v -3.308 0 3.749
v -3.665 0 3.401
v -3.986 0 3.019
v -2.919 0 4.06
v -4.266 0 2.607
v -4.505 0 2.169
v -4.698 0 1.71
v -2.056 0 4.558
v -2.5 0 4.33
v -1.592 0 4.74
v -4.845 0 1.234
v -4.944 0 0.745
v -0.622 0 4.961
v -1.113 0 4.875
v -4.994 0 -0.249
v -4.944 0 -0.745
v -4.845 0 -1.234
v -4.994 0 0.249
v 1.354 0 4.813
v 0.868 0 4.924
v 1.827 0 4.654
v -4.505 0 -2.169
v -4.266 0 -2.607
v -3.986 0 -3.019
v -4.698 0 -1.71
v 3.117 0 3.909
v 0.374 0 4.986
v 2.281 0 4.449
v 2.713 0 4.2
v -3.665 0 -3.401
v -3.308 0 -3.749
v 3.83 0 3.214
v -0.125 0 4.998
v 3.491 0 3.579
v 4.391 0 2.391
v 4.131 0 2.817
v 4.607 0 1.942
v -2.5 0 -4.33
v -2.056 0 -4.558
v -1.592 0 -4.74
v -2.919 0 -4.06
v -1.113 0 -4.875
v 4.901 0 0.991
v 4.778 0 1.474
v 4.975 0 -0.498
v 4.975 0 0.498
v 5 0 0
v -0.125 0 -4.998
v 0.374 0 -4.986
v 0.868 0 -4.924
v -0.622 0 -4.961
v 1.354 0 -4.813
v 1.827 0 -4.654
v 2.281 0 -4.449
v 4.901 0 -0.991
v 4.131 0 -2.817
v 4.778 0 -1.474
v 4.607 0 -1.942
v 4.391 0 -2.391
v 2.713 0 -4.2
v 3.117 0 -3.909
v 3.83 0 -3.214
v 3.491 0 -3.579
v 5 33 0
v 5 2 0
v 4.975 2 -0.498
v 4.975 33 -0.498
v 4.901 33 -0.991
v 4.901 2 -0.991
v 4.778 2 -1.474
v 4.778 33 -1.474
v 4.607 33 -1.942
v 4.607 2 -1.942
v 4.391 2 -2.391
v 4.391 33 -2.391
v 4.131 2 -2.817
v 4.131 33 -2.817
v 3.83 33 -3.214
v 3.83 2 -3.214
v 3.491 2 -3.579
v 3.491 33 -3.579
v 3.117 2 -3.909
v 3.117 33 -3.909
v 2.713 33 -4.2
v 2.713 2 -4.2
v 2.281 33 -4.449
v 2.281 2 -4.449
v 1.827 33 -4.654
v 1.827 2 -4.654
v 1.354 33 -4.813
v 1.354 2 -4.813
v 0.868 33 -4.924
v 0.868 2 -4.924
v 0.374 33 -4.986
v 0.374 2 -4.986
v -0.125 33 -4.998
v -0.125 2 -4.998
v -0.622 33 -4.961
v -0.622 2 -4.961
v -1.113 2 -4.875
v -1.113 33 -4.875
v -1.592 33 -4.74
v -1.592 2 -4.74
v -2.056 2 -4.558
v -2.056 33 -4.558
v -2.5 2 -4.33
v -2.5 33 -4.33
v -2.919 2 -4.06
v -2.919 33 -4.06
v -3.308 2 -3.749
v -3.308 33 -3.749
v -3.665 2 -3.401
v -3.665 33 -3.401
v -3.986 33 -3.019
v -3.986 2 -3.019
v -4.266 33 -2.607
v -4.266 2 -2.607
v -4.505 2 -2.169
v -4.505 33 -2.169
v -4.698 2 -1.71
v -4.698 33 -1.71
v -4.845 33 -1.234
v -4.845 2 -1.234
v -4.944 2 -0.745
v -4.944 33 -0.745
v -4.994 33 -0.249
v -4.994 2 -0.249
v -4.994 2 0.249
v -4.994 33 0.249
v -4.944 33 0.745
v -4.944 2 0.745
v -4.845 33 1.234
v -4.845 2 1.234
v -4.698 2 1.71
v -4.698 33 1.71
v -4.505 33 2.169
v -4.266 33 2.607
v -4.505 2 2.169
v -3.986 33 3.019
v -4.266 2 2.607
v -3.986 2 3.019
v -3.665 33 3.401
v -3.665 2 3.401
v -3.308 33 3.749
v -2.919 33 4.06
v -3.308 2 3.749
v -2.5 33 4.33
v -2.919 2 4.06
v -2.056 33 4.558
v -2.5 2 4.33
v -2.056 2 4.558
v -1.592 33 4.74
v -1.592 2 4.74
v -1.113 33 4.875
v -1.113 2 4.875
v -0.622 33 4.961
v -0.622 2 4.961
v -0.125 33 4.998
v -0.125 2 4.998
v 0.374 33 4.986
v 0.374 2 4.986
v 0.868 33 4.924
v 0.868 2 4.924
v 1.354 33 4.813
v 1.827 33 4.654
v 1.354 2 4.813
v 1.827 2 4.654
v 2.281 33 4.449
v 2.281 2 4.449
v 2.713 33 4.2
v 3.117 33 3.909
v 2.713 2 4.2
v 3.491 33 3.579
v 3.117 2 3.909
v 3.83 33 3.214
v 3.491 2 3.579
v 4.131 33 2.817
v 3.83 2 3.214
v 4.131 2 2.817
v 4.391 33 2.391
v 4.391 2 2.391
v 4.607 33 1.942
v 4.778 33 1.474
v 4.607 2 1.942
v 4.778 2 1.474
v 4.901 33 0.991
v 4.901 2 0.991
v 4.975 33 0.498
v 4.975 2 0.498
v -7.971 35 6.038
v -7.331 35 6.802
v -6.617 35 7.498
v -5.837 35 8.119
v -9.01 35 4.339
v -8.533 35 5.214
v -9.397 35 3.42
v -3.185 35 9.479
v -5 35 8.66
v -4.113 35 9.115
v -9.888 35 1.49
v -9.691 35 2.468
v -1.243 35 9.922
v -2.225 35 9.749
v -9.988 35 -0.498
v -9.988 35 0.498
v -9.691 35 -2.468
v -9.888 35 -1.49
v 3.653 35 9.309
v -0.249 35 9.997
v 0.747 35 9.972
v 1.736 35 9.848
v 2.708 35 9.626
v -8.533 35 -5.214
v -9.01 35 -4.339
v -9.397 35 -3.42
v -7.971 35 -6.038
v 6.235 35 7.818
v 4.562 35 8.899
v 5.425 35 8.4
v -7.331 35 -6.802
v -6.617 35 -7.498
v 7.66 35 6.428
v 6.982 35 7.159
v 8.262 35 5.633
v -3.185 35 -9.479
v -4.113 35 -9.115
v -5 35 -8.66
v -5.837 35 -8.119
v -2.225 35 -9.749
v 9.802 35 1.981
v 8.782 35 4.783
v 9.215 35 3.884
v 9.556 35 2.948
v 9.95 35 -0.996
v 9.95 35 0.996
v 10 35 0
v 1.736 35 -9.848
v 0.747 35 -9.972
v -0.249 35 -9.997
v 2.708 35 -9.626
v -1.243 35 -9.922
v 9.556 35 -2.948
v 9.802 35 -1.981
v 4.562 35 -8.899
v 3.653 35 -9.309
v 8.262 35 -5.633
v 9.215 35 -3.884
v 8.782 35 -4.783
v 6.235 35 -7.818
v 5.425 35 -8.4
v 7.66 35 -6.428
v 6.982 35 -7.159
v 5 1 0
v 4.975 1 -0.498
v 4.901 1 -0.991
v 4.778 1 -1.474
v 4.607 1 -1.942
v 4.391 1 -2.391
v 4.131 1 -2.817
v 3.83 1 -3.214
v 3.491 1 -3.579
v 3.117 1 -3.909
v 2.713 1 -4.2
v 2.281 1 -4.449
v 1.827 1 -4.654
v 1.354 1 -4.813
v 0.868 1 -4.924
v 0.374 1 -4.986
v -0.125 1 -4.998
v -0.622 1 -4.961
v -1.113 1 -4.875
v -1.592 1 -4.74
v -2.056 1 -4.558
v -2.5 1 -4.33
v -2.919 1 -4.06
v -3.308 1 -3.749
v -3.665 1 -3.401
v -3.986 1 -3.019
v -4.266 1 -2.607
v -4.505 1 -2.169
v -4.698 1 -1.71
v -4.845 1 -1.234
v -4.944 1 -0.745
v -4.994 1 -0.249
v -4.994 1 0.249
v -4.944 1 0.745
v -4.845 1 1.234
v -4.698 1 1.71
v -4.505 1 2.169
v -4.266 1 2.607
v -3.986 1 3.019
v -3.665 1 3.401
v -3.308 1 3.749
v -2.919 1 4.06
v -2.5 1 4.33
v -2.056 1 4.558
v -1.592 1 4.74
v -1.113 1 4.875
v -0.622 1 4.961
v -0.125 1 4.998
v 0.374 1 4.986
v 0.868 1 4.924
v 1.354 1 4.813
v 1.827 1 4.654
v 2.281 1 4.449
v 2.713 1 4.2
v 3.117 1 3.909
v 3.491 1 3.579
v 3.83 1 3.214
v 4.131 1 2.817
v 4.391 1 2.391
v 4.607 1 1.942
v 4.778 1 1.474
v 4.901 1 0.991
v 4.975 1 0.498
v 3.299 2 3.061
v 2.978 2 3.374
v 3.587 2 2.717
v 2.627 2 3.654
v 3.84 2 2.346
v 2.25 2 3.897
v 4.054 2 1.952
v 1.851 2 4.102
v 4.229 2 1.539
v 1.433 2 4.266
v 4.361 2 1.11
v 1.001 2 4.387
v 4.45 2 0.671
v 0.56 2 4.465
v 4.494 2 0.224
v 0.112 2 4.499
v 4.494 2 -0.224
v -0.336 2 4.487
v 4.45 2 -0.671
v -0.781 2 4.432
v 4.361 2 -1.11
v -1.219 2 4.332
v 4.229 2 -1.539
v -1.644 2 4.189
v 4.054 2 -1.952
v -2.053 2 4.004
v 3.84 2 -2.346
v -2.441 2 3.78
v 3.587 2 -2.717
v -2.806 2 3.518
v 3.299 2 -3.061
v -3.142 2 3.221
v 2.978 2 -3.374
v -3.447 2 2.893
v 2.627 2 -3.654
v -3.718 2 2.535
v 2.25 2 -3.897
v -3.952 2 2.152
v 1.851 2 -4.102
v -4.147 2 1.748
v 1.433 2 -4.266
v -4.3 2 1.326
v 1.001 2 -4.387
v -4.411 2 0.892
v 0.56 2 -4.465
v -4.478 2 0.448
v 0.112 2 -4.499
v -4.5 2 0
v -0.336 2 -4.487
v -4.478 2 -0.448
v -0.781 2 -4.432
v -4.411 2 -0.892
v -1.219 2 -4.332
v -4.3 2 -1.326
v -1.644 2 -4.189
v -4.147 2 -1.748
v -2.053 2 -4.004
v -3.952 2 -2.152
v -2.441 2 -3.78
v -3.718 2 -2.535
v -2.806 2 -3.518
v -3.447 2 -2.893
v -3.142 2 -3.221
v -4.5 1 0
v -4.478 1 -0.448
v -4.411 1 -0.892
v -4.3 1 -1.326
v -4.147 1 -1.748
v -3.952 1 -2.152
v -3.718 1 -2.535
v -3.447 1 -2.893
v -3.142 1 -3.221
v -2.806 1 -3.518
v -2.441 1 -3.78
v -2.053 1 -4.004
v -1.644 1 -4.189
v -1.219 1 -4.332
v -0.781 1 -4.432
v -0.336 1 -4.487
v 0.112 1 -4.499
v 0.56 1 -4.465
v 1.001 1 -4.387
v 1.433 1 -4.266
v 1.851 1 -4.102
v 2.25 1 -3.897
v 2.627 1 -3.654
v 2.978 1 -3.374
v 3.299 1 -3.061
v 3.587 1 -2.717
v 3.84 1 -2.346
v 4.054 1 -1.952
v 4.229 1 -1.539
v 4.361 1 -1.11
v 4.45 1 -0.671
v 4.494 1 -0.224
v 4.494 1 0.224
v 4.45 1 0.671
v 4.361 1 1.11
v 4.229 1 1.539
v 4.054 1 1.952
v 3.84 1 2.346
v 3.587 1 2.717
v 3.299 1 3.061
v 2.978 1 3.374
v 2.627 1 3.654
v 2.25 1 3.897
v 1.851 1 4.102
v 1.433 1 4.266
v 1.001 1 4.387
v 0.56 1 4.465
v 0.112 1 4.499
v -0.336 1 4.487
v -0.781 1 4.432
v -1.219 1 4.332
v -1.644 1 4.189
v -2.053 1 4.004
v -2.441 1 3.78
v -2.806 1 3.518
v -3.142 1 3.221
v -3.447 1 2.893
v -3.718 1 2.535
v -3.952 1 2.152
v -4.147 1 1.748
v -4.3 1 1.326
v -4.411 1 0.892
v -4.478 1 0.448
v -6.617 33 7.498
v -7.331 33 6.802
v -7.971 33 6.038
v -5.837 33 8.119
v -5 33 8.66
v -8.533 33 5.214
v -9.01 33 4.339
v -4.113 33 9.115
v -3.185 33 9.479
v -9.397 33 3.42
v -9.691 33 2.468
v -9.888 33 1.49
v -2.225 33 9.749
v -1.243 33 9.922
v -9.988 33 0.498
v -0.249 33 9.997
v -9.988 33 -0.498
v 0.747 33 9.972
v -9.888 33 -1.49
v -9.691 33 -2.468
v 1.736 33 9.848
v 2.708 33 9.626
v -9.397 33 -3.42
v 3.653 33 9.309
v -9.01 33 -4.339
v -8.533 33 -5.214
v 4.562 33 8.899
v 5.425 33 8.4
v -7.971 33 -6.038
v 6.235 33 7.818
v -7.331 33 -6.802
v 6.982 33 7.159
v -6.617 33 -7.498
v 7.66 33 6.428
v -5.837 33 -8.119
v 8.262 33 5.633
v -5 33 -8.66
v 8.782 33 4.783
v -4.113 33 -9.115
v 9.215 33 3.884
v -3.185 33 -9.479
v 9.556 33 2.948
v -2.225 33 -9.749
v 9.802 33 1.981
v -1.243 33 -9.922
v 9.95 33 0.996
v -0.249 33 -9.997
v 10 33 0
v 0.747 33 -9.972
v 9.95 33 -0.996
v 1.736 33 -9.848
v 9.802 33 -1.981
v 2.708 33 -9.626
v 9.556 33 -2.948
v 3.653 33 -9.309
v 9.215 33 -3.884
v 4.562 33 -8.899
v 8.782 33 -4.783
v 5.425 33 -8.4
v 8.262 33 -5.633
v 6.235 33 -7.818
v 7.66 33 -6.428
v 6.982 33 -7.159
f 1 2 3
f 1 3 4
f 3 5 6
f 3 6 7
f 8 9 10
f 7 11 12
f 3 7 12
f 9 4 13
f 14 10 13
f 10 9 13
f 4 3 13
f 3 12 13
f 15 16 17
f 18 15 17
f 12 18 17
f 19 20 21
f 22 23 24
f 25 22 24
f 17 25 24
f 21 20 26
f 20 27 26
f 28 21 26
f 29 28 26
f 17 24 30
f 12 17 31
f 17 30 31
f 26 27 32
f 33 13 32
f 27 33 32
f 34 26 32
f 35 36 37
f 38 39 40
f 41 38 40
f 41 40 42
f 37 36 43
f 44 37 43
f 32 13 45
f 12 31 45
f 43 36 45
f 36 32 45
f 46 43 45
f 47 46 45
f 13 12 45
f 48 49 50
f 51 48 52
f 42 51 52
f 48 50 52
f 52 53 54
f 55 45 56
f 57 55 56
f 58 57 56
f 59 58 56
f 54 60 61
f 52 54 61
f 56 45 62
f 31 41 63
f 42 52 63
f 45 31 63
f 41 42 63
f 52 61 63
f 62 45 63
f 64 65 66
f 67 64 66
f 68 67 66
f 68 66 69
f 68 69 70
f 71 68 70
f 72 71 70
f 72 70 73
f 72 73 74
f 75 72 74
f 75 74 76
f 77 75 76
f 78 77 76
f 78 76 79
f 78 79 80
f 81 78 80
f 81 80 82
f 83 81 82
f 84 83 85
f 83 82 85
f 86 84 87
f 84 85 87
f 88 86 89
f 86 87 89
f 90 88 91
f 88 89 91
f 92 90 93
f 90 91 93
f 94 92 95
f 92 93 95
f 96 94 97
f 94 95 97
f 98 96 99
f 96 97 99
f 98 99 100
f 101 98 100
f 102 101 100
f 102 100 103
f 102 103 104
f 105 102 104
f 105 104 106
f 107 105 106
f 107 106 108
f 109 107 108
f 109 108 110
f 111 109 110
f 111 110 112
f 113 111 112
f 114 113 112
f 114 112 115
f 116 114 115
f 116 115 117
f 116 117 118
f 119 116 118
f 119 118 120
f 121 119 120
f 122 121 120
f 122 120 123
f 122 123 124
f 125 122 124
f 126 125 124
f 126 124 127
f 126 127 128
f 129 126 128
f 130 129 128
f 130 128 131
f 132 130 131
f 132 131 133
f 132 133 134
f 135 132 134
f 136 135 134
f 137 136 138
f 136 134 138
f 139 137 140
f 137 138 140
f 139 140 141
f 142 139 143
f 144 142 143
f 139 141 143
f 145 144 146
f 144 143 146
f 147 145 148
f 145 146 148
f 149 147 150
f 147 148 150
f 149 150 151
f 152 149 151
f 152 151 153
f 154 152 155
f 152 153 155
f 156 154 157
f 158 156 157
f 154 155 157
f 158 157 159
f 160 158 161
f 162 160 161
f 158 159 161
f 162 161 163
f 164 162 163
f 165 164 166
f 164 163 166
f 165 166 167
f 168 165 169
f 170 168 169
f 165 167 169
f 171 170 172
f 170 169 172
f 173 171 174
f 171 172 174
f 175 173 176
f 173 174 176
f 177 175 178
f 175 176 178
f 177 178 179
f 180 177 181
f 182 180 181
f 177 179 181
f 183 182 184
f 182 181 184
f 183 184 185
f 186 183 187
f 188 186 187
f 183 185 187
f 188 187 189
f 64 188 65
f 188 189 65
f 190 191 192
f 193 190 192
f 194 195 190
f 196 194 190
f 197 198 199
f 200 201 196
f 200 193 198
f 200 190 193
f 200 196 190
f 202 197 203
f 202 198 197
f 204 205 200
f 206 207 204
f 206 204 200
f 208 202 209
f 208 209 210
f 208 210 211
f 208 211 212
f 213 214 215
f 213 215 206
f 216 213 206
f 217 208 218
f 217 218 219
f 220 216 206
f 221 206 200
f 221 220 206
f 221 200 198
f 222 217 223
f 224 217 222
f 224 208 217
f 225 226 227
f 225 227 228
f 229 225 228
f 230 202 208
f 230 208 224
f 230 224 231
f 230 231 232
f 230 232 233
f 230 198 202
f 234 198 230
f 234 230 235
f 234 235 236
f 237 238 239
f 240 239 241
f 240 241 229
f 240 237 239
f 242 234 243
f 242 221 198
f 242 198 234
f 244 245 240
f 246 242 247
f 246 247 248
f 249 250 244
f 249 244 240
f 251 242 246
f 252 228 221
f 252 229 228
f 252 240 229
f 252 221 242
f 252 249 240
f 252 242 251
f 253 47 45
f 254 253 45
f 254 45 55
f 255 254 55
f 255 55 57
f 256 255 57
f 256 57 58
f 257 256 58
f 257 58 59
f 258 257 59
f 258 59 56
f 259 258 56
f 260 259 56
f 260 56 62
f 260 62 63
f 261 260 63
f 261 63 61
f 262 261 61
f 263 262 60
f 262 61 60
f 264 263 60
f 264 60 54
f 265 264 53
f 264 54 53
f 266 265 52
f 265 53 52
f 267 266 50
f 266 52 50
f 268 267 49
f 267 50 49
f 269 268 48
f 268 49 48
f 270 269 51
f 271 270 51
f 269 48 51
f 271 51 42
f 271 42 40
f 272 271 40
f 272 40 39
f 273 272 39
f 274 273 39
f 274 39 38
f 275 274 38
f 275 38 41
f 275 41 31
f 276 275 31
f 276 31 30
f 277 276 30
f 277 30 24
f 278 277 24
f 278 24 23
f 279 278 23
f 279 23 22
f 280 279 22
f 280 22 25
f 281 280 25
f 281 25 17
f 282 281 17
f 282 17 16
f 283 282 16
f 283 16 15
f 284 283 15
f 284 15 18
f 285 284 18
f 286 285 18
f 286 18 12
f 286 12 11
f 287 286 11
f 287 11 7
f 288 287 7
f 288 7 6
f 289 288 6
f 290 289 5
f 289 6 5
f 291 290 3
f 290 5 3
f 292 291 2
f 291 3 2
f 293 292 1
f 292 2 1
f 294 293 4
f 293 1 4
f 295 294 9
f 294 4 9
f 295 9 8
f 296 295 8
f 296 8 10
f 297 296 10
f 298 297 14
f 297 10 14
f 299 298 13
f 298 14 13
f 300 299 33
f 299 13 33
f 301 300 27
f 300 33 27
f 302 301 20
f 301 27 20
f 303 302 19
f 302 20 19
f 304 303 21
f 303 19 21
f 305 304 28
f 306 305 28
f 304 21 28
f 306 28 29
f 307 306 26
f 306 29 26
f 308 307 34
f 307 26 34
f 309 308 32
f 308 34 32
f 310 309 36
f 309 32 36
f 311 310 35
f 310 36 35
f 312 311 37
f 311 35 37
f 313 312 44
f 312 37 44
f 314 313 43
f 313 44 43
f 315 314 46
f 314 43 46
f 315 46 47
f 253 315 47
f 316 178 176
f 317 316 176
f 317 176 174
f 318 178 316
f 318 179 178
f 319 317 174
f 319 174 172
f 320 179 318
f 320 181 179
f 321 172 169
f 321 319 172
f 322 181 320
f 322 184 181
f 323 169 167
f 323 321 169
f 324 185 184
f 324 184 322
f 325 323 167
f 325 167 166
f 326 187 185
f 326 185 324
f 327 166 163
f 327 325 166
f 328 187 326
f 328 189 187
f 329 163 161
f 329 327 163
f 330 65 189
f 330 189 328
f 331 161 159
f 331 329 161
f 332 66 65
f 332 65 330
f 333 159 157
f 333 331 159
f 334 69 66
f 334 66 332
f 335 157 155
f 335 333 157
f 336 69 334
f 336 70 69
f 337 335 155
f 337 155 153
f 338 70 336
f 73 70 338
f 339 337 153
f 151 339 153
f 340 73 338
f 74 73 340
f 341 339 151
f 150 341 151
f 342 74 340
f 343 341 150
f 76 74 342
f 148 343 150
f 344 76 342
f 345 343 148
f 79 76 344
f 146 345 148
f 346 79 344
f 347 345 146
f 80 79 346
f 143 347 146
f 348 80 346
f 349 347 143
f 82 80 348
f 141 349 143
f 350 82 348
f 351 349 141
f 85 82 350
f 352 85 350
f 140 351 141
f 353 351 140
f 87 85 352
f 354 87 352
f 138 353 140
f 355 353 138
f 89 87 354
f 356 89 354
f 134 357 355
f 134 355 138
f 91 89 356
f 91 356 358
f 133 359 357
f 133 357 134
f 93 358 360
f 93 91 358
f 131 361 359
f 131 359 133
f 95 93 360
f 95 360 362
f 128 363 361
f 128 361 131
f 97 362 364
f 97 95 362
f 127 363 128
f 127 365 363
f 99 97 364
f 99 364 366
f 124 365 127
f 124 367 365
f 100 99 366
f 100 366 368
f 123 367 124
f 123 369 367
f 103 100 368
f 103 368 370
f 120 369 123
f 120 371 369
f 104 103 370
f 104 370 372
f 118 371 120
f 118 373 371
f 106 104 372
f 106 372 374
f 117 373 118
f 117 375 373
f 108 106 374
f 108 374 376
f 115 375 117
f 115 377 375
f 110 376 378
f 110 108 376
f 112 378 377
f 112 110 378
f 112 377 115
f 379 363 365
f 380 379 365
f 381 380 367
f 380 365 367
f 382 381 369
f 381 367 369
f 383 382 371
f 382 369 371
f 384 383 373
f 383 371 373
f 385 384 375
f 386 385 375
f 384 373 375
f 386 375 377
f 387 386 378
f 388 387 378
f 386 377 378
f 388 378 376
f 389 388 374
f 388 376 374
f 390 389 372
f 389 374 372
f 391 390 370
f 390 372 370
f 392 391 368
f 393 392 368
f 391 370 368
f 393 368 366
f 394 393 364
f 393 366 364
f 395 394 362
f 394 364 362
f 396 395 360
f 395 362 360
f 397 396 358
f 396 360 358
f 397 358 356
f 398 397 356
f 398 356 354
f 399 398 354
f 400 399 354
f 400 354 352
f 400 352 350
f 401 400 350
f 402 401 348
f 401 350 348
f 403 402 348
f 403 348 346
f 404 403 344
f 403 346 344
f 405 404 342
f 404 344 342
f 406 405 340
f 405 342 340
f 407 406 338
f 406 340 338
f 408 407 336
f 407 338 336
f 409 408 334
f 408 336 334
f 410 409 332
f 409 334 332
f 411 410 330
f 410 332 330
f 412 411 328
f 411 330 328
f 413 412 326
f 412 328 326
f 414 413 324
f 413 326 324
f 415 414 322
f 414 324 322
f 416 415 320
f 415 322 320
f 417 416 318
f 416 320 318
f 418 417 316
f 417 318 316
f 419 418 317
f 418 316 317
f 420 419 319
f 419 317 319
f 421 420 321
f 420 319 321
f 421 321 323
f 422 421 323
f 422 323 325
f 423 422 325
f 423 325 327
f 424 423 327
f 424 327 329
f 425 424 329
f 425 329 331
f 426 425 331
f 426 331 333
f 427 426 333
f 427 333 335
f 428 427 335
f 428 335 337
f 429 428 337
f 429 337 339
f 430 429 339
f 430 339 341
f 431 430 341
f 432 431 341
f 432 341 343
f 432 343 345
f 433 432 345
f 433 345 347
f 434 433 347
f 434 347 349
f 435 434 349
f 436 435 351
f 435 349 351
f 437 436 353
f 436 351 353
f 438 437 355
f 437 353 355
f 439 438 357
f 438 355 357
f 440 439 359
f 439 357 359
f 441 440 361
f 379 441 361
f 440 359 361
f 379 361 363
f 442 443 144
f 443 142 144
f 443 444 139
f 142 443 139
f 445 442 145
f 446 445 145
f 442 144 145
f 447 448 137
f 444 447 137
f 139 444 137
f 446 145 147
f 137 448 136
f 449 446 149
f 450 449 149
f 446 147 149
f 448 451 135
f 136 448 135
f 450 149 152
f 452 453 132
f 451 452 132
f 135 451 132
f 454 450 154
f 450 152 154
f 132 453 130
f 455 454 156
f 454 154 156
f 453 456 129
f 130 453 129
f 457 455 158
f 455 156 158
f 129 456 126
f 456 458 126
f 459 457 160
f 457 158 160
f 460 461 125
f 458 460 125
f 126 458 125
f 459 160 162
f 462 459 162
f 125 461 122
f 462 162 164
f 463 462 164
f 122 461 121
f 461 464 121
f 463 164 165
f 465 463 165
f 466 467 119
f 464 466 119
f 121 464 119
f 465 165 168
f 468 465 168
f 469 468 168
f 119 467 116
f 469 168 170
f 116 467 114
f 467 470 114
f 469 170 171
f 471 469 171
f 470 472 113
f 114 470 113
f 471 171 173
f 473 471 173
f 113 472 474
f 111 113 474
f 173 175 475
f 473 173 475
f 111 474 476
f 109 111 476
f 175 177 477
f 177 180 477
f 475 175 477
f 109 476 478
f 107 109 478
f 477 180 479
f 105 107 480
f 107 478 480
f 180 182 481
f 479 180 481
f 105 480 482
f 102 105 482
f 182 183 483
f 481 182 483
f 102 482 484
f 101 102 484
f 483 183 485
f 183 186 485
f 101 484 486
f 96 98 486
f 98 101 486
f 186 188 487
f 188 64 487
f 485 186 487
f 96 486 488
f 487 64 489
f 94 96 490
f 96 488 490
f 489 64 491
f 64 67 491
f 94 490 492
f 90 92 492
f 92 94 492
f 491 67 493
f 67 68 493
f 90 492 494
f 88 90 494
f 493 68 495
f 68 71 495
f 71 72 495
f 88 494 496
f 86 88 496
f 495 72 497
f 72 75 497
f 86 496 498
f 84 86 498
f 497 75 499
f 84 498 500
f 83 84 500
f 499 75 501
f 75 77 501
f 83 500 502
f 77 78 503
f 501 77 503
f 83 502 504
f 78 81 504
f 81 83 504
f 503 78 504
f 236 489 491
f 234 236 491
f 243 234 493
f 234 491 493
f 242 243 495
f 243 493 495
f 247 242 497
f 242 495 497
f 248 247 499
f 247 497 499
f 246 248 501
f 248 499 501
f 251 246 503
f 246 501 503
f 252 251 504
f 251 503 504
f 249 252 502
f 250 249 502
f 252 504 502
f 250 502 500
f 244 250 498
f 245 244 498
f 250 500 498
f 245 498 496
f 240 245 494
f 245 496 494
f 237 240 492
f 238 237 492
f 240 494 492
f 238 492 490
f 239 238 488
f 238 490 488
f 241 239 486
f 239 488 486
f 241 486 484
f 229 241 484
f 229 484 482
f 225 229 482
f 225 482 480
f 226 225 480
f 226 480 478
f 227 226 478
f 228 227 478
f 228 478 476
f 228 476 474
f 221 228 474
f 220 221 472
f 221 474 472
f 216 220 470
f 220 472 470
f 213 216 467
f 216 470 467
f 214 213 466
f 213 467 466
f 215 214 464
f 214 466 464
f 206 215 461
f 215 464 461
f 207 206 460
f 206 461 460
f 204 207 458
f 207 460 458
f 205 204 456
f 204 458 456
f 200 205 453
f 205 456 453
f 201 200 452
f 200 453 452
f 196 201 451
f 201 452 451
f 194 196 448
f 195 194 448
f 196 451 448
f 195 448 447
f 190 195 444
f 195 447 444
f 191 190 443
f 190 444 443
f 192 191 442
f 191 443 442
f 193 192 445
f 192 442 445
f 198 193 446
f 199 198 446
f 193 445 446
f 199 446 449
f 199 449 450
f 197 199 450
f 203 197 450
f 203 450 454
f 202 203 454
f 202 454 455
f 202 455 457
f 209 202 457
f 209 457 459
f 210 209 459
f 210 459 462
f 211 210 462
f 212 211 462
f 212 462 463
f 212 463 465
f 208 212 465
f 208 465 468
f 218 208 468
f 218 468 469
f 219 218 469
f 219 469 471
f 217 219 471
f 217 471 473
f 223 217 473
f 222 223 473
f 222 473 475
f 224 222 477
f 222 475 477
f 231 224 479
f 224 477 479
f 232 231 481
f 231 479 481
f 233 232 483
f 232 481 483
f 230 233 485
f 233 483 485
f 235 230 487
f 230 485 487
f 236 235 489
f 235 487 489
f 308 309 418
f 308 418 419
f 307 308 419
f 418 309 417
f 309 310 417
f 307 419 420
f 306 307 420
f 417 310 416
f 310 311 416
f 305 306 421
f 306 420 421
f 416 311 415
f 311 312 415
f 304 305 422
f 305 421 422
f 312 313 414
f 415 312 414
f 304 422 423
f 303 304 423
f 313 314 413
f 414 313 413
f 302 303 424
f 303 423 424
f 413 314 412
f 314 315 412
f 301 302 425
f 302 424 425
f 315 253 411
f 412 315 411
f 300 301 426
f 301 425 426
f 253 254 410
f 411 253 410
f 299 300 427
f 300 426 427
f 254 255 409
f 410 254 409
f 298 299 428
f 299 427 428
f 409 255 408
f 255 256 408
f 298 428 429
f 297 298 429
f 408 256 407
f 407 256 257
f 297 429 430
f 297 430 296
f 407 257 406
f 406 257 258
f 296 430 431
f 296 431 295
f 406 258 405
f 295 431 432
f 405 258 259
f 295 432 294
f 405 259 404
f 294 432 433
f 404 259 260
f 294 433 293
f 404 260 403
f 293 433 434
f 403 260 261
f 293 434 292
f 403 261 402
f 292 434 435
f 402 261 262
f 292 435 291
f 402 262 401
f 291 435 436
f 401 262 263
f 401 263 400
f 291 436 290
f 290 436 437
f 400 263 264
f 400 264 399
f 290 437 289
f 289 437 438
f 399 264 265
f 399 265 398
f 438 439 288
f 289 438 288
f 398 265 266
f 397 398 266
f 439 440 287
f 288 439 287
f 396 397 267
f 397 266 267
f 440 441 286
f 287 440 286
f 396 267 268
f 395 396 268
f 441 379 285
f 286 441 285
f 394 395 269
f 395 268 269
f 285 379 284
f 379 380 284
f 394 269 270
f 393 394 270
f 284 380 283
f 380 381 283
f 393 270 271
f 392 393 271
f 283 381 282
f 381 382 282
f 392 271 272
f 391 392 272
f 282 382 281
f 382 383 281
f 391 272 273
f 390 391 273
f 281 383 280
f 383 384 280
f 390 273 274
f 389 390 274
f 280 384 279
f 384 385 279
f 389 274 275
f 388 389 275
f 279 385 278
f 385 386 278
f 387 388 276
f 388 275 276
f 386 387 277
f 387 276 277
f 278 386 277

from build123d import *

# Parameters (mm, degrees)
CROQUIS1_R              = 5
SALIENTE_EXTRUIR1_DEPTH = 33
CROQUIS2_R              = 10
SALIENTE_EXTRUIR2_DEPTH = 2
SKETCH3_R               = 5
SKETCH3_R_2             = 4.5
CUT_EXTRUDE1_DEPTH      = 1


with BuildPart() as part:
    # Croquis1 → Saliente-Extruir1 (new body)
    with BuildSketch(Plane(origin=(0, 0, 0), x_dir=(1, 0, 0), z_dir=(0, 1, 0))):
        Circle(CROQUIS1_R)
    extrude(amount=SALIENTE_EXTRUIR1_DEPTH)

    # Croquis2 → Saliente-Extruir2 (add)
    with BuildSketch(Plane(origin=(0, 33, 0), x_dir=(1, 0, 0), z_dir=(0, 1, 0))):
        Circle(CROQUIS2_R)
    extrude(amount=SALIENTE_EXTRUIR2_DEPTH)

    # Sketch3 → Cut-Extrude1 (cut)
    with BuildSketch(Plane(origin=(0, 2, 0), x_dir=(-1, 0, 0), z_dir=(0, -1, 0))):
        Circle(SKETCH3_R)
        Circle(SKETCH3_R_2, mode=Mode.SUBTRACT)
    extrude(amount=CUT_EXTRUDE1_DEPTH, mode=Mode.SUBTRACT)


solid = part.part
